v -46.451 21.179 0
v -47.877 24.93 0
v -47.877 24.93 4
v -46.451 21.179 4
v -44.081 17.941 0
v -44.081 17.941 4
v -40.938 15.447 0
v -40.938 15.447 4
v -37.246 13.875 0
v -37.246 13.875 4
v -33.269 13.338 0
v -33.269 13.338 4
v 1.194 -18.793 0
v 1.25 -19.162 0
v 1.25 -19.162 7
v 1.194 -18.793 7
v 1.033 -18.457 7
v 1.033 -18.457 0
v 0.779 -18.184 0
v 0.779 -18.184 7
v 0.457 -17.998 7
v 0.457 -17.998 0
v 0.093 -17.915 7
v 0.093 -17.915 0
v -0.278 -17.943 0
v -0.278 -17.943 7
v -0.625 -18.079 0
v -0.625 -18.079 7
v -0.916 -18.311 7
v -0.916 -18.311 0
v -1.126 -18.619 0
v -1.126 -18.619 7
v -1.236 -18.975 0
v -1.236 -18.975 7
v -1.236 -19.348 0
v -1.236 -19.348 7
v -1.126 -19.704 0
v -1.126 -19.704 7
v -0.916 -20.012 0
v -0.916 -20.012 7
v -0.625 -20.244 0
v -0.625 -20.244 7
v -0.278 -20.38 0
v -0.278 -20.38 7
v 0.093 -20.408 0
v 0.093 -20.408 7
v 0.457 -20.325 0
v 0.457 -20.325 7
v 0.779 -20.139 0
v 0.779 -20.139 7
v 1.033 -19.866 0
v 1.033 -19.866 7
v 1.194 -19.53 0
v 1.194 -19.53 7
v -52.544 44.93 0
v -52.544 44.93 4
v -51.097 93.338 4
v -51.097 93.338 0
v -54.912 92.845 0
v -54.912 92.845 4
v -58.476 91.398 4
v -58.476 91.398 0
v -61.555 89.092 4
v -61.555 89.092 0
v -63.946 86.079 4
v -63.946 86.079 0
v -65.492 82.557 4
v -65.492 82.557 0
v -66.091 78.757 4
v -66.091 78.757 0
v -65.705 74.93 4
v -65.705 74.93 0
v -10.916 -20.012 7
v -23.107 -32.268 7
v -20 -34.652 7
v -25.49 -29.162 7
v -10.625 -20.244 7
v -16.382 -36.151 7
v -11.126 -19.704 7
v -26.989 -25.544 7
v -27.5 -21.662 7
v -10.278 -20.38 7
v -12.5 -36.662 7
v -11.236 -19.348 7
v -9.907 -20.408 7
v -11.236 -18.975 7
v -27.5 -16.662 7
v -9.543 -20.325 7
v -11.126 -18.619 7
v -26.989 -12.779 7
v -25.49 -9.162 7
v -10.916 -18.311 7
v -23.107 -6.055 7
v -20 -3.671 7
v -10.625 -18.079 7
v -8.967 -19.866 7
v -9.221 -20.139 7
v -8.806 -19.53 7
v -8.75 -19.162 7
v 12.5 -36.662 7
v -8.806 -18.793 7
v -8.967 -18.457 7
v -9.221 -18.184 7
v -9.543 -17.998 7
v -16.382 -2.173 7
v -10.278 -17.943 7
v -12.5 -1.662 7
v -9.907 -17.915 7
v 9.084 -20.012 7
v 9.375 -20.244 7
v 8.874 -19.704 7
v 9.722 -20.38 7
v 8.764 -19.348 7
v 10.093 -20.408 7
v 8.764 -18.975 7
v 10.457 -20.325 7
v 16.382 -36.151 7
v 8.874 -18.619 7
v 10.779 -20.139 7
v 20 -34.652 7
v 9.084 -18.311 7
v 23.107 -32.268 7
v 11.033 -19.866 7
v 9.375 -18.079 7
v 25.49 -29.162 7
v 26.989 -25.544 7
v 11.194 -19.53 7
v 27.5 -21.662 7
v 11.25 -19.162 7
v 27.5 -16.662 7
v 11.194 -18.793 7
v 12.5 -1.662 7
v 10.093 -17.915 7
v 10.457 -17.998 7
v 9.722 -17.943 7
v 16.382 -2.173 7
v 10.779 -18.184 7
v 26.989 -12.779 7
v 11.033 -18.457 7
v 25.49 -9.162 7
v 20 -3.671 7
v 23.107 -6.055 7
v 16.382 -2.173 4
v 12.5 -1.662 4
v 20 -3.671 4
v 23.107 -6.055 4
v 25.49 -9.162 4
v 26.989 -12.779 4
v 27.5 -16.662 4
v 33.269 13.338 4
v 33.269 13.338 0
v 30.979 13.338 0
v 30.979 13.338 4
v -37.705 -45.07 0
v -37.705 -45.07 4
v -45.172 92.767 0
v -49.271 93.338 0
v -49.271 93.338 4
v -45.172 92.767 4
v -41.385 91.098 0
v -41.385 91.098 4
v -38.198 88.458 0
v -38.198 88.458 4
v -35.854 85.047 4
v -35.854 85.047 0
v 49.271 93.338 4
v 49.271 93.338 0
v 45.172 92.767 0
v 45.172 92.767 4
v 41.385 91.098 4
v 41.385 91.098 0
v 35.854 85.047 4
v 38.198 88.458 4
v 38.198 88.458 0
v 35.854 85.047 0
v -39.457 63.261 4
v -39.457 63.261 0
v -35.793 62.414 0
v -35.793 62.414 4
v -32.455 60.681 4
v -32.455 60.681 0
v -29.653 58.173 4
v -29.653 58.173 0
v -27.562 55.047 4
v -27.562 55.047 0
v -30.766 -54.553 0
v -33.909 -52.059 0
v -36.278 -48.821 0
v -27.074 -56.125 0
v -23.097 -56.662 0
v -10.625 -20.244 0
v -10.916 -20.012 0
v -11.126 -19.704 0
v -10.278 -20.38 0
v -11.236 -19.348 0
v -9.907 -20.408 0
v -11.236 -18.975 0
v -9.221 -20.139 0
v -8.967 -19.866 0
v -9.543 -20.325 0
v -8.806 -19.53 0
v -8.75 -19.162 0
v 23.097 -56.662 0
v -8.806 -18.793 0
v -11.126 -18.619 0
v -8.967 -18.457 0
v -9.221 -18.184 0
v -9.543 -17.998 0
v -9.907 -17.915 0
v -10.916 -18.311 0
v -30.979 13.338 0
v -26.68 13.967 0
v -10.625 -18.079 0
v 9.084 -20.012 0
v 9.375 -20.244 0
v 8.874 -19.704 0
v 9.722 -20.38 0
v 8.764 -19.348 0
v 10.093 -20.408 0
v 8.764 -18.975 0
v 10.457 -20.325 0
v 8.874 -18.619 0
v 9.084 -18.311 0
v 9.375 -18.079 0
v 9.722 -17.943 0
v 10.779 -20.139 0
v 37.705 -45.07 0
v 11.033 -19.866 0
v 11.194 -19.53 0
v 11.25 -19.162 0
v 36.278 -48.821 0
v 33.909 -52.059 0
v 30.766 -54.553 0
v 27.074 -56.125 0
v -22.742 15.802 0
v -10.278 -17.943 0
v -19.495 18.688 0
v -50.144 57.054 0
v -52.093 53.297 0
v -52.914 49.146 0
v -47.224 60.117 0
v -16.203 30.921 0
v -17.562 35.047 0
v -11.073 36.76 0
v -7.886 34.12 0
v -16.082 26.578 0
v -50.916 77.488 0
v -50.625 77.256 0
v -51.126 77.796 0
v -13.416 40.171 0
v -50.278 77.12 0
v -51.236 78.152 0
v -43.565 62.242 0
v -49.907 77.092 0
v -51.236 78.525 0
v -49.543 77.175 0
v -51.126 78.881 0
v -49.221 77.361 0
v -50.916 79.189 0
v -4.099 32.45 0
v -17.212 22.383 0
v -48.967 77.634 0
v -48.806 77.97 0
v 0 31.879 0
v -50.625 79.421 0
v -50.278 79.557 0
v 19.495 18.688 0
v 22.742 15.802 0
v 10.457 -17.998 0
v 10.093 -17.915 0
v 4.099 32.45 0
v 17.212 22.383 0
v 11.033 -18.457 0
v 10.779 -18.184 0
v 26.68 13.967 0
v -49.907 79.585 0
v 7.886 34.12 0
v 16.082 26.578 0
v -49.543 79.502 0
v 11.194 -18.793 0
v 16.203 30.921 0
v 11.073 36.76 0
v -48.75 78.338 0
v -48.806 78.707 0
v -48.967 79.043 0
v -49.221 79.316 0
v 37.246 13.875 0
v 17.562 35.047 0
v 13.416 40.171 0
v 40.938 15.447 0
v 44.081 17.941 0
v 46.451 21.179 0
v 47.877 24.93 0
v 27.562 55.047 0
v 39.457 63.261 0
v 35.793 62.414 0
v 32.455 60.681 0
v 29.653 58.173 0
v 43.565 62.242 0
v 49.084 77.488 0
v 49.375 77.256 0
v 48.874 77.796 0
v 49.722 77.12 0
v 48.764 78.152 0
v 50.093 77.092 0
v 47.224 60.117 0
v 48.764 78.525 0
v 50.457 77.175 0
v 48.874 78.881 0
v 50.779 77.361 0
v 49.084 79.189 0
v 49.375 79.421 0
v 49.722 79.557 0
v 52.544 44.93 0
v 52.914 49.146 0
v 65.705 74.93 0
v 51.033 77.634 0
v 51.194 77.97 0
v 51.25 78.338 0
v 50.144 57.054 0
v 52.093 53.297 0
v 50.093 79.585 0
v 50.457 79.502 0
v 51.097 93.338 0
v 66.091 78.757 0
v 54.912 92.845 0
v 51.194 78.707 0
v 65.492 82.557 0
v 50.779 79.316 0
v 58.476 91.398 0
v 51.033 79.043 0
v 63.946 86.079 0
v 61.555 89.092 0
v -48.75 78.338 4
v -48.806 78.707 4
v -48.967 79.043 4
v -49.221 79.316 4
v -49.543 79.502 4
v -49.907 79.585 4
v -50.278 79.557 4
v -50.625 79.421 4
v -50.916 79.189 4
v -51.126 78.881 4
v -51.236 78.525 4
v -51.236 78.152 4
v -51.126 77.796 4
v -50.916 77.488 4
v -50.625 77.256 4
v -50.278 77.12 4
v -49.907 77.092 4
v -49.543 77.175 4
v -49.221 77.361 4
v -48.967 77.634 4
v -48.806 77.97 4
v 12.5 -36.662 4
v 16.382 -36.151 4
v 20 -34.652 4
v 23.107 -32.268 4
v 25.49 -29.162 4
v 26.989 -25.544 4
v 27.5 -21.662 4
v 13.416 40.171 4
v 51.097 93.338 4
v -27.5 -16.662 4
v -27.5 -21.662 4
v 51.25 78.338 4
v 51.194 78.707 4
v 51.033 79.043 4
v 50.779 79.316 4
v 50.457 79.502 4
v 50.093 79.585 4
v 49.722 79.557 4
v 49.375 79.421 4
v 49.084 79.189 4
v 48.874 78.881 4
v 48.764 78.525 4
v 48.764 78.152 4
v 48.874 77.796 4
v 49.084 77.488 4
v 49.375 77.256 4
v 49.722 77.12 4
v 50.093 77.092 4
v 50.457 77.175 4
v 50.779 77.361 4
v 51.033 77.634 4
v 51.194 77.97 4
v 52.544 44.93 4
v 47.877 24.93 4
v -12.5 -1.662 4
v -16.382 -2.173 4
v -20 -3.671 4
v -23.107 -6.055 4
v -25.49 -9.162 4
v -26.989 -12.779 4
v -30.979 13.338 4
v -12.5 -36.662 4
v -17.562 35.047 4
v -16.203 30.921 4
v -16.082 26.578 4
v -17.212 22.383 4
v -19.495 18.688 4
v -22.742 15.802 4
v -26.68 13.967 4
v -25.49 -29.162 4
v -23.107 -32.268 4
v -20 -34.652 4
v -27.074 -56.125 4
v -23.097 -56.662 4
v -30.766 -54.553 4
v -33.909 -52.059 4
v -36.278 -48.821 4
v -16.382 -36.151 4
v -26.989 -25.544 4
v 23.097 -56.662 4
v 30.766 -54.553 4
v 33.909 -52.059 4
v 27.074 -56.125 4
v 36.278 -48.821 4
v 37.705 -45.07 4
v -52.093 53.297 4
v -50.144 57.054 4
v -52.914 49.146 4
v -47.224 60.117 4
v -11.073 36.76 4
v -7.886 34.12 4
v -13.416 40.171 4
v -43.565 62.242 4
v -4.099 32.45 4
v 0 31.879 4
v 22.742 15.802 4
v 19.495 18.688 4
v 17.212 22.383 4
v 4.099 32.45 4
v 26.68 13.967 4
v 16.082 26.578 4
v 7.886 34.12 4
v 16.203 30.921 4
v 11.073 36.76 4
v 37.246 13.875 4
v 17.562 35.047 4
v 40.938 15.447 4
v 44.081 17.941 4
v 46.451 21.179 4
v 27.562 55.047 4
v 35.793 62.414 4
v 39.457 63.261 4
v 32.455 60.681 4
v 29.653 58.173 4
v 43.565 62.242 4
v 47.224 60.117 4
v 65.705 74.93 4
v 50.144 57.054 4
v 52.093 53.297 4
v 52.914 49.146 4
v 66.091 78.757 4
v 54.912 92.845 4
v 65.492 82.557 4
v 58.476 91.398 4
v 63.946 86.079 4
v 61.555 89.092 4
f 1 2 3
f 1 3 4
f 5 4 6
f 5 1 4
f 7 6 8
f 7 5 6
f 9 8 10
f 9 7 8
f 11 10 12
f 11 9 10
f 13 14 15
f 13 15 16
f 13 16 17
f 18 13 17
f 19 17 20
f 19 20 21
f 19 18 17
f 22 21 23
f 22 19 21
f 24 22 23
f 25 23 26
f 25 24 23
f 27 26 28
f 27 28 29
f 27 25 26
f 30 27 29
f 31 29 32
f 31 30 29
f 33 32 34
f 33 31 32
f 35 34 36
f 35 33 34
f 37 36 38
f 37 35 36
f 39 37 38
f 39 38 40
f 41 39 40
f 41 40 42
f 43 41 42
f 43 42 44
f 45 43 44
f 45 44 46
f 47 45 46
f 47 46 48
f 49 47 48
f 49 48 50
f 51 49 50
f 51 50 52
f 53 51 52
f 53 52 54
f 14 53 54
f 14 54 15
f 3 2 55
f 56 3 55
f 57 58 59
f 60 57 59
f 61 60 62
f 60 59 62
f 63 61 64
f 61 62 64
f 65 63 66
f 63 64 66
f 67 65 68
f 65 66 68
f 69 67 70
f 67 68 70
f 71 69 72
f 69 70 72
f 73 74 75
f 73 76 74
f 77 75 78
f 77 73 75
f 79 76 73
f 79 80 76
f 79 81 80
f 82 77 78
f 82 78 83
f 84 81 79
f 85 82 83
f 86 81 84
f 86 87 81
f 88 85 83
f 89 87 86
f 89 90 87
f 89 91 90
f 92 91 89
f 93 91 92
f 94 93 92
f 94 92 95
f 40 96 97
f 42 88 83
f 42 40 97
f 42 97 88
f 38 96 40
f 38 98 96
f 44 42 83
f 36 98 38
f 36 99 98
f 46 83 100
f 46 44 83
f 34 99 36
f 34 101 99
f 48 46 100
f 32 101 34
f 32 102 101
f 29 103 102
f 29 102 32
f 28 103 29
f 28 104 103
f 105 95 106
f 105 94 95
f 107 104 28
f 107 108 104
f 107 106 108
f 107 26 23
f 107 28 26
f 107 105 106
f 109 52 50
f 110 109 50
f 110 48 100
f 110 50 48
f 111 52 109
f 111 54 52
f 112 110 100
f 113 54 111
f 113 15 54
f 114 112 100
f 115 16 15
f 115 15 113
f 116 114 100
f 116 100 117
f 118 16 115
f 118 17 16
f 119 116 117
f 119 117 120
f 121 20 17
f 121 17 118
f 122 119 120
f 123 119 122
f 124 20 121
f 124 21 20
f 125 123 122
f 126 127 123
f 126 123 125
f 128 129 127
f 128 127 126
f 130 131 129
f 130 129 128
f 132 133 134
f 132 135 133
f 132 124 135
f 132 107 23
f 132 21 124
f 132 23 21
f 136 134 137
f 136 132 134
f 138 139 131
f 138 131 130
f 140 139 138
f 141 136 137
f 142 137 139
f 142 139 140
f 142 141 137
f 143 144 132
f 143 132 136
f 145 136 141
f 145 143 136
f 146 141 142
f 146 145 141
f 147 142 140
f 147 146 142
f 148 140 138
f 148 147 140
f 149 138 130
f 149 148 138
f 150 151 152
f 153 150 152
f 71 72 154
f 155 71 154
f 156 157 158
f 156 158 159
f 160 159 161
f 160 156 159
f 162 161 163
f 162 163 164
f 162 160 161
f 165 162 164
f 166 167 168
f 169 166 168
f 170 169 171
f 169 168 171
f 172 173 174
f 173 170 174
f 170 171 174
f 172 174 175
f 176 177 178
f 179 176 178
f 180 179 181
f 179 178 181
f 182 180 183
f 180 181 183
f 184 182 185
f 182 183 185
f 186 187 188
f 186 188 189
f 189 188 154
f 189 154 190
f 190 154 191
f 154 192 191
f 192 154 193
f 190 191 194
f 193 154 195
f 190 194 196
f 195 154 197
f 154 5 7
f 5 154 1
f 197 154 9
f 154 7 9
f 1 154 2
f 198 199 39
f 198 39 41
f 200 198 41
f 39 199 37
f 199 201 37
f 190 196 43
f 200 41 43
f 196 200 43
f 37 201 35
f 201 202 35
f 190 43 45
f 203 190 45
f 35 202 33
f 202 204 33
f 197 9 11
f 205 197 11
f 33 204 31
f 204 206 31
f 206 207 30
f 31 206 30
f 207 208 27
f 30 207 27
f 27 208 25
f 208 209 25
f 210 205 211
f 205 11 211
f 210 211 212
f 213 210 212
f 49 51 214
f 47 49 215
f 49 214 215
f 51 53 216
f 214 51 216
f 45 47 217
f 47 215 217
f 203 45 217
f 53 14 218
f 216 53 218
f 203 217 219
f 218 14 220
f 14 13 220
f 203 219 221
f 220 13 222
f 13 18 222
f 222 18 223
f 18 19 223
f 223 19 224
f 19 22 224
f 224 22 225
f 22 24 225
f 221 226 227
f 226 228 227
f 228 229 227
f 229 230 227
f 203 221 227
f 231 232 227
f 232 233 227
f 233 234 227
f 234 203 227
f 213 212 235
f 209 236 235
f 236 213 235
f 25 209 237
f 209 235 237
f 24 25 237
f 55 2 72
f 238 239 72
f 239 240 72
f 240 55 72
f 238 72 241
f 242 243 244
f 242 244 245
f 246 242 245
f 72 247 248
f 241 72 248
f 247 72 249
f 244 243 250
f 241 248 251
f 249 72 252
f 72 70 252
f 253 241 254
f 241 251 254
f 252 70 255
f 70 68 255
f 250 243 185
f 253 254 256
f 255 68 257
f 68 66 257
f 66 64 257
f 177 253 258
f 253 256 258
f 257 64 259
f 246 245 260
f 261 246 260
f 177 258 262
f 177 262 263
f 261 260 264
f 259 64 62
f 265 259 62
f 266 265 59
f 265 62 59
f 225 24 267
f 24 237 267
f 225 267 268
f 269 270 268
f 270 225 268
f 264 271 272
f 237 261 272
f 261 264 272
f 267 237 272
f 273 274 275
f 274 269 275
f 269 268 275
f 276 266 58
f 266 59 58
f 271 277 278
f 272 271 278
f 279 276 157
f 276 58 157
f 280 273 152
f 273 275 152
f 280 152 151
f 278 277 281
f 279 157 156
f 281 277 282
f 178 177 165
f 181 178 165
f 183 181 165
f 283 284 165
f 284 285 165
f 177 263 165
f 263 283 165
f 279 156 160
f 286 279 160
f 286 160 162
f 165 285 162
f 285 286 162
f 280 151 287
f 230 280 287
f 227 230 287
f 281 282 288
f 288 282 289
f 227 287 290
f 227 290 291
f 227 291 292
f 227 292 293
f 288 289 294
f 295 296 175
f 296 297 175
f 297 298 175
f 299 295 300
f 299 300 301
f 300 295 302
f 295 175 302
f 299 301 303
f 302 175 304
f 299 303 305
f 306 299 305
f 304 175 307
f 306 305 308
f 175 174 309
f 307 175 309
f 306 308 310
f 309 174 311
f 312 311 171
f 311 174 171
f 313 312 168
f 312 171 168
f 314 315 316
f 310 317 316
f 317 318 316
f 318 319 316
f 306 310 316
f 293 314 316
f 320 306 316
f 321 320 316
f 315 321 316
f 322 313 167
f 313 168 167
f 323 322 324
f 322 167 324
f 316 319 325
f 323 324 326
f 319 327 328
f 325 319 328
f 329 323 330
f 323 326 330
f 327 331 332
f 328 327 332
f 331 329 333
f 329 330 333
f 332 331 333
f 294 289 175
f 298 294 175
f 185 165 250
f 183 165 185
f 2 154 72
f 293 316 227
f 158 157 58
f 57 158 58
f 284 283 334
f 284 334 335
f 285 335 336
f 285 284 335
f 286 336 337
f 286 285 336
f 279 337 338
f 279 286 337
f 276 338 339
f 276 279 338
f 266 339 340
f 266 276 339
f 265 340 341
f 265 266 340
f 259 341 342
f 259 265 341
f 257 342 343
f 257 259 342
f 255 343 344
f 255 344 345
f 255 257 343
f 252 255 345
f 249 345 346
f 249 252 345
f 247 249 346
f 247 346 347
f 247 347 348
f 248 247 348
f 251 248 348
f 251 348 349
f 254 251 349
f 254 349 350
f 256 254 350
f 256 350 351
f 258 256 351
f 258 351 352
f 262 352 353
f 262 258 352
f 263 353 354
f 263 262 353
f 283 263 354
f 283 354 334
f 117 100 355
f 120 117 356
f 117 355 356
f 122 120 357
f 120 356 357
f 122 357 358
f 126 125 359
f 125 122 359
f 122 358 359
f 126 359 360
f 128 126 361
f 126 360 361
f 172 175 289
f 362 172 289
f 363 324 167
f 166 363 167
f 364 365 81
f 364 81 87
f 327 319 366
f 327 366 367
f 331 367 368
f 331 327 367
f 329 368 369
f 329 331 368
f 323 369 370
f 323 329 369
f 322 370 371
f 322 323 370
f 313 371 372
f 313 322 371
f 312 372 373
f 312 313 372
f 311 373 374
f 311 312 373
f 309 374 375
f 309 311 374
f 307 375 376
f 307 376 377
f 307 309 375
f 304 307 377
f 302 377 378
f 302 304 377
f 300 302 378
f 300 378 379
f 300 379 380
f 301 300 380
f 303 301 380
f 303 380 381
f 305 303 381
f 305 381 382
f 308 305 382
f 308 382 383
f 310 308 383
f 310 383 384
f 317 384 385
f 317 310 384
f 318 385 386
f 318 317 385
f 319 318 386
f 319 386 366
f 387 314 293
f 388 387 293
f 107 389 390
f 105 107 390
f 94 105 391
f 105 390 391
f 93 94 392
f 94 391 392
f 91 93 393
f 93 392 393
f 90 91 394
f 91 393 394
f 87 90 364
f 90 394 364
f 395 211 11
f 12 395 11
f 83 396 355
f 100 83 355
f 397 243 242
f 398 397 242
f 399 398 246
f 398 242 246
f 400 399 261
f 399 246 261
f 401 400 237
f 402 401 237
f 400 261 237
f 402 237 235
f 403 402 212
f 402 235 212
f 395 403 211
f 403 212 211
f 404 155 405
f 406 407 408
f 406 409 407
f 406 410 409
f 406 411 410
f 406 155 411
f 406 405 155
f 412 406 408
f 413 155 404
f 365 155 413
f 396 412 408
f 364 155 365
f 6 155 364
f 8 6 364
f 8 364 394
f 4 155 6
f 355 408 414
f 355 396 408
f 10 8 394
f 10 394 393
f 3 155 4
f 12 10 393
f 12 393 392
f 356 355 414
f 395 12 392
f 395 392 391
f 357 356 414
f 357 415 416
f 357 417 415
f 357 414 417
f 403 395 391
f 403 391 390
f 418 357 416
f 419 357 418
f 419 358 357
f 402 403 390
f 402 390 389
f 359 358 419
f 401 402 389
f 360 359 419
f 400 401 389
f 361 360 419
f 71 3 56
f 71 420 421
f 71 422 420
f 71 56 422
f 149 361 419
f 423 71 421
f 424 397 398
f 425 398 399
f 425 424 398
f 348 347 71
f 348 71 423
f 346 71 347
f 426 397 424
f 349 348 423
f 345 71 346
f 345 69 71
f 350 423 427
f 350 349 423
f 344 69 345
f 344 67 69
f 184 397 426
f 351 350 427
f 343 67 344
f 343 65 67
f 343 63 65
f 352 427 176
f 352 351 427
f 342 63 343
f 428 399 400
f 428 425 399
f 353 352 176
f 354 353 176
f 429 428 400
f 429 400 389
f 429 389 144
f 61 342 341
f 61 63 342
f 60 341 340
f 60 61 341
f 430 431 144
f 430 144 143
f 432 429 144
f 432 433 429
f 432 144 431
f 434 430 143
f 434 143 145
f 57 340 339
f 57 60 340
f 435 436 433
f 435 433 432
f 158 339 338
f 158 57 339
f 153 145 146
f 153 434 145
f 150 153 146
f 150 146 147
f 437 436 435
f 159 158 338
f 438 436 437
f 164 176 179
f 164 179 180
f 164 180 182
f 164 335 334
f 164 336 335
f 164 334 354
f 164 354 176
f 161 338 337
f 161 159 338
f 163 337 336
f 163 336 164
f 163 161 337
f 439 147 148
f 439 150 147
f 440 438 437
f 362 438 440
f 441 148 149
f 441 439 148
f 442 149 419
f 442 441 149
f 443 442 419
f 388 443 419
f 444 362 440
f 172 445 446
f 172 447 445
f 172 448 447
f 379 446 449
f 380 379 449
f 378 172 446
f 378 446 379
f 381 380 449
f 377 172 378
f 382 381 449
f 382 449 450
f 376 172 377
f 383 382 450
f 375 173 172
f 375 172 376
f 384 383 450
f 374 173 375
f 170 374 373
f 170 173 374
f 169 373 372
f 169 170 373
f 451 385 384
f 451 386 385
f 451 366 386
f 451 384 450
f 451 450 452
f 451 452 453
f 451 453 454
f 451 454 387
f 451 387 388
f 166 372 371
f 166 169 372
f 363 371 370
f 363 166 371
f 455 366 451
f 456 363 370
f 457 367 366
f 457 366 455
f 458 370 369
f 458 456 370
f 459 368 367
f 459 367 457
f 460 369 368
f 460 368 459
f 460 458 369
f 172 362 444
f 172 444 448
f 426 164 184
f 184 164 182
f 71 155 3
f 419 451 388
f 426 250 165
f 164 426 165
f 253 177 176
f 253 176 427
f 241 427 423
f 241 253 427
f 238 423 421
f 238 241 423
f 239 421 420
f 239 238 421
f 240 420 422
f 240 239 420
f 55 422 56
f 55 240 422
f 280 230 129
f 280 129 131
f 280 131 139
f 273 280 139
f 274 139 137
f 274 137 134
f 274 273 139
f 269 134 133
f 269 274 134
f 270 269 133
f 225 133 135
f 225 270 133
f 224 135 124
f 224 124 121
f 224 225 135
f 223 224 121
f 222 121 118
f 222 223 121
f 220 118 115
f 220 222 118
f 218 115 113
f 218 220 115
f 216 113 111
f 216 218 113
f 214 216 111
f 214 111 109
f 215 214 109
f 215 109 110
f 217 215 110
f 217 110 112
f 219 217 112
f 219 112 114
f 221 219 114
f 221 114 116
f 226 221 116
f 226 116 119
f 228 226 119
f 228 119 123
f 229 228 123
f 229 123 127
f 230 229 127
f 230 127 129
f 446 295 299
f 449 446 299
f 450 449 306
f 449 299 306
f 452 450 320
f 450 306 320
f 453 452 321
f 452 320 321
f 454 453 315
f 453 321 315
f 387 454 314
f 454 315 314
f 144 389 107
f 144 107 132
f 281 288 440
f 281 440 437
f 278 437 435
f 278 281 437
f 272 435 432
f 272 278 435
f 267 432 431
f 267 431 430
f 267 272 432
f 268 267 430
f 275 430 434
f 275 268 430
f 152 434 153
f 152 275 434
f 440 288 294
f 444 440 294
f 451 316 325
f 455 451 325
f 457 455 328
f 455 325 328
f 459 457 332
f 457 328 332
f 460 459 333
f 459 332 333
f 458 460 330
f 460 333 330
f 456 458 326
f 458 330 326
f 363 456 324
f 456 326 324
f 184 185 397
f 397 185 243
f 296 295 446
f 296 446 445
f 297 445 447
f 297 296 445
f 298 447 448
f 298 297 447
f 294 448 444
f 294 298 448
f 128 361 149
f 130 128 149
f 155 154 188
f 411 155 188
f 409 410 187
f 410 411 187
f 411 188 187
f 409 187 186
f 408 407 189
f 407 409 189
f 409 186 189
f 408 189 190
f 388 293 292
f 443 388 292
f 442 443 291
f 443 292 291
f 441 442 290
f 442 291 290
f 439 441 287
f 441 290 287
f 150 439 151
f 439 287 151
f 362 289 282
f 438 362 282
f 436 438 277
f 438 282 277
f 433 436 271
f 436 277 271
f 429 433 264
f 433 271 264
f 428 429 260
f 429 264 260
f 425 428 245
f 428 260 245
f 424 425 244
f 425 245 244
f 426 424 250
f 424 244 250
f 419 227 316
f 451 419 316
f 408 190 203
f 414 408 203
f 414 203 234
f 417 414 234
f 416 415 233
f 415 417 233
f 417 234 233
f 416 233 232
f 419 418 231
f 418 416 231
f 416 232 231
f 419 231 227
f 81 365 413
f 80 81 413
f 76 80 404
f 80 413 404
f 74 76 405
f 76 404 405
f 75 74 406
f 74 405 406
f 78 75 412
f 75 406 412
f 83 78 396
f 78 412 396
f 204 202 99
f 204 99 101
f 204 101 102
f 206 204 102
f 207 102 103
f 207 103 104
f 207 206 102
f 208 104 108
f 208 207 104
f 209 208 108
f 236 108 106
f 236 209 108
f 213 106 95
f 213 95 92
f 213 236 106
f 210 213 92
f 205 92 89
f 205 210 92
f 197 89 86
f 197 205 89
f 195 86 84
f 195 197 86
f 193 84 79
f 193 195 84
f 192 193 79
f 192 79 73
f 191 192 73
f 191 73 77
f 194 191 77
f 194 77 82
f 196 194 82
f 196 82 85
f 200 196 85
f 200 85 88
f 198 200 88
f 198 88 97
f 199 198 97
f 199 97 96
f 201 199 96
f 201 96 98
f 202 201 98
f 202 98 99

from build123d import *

# Parameters (mm, degrees)
F0_R        = 1.25
F0_W        = 70
F0_H        = 60
F0_W_2      = 55
F0_H_2      = 35
F1_DEPTH    = 4
F2_DEPTH    = 7
F3_T1_DEPTH = 4
F3_T3_DEPTH = 50.3525491562
F3_T5_DEPTH = 98.5146090037
F3_T7_DEPTH = 40.5
F3_T9_DEPTH = 63.5146090037


# Not quite as in the source:
# - a fillet or chamfer that OpenCascade refuses, or shapes differently, is made with other operations: its cross-section is extruded or revolved along the edge and cut away or added


with BuildPart() as f1:
    # F0 (on Top) → F1 (new body)
    with BuildSketch(Plane.XY):
        Polygon((-40, 93.3383707737), (-70, 93.3383707737), (-35, -56.6616292263), (-35, 3.3383707737), (35, 3.3383707737), (35, -56.6616292263), (70, 93.3383707737), (40, 93.3383707737), (0, 13.3383707737), align=None)
        Polygon((-45.172164613, 13.3383707737), (-56.8388312797, 63.3383707737), (-31.7082039325, 63.3383707737), (-6.7082039325, 13.3383707737), align=None, mode=Mode.SUBTRACT)
        with Locations((-50, 78.3383707737)):
            Circle(F0_R, mode=Mode.SUBTRACT)
        Polygon((6.7082039325, 13.3383707737), (31.7082039325, 63.3383707737), (56.8388312797, 63.3383707737), (45.172164613, 13.3383707737), align=None, mode=Mode.SUBTRACT)
        with Locations((50, 78.3383707737)):
            Circle(F0_R, mode=Mode.SUBTRACT)
        with Locations((0, -26.6616292263)):
            Rectangle(F0_W, F0_H)
        with Locations((0, -19.1616292263)):
            Rectangle(F0_W_2, F0_H_2, mode=Mode.SUBTRACT)
        with Locations((0, -19.1616292263)):
            Rectangle(F0_W_2, F0_H_2)
        with Locations((-10, -19.1616292263)):
            Circle(F0_R, mode=Mode.SUBTRACT)
        with Locations((0, -19.1616292263)):
            Circle(F0_R, mode=Mode.SUBTRACT)
        with Locations((10, -19.1616292263)):
            Circle(F0_R, mode=Mode.SUBTRACT)
    extrude(amount=F1_DEPTH)

    # F0 (on Top) → F2 (join)
    with BuildSketch(Plane.XY):
        with Locations((0, -19.1616292263)):
            Rectangle(F0_W_2, F0_H_2)
        with Locations((-10, -19.1616292263)):
            Circle(F0_R, mode=Mode.SUBTRACT)
        with Locations((0, -19.1616292263)):
            Circle(F0_R, mode=Mode.SUBTRACT)
        with Locations((10, -19.1616292263)):
            Circle(F0_R, mode=Mode.SUBTRACT)
    extrude(amount=F2_DEPTH)

    # F3: fillet of radius 15 on 19 edges, made by hand

    # F3_s2 → F3_t1 (join)
    with BuildSketch(Plane.XY):
        with BuildLine():
            ThreePointArc((13.416407865, 40.1711865037), (0, 31.8793904362), (-13.416407865, 40.1711865037))
            Line((-13.416407865, 40.1711865037), (0, 13.3383707737))
            Line((0, 13.3383707737), (13.416407865, 40.1711865037))
        make_face()
        with BuildLine():
            ThreePointArc((17.5623058987, 35.0465747062), (18.2189516385, 20.452404092), (30.9787137637, 13.3383707737))
            Line((30.9787137637, 13.3383707737), (6.7082039325, 13.3383707737))
            Line((6.7082039325, 13.3383707737), (17.5623058987, 35.0465747062))
        make_face()
        with BuildLine():
            ThreePointArc((47.8768609584, 24.9299265396), (42.5932263089, 16.5883353799), (33.2692428123, 13.3383707737))
            Line((33.2692428123, 13.3383707737), (45.172164613, 13.3383707737))
            Line((45.172164613, 13.3383707737), (47.8768609584, 24.9299265396))
        make_face()
        with BuildLine():
            ThreePointArc((-17.5623058987, 35.0465747062), (-18.2189516385, 20.452404092), (-30.9787137637, 13.3383707737))
            Line((-30.9787137637, 13.3383707737), (-6.7082039325, 13.3383707737))
            Line((-6.7082039325, 13.3383707737), (-17.5623058987, 35.0465747062))
        make_face()
        with BuildLine():
            ThreePointArc((-47.8768609584, 24.9299265396), (-42.5932263089, 16.5883353799), (-33.2692428123, 13.3383707737))
            Line((-33.2692428123, 13.3383707737), (-45.172164613, 13.3383707737))
            Line((-45.172164613, 13.3383707737), (-47.8768609584, 24.9299265396))
        make_face()
        with BuildLine():
            ThreePointArc((-37.935909479, 63.3383707737), (-49.6859448728, 57.6623542703), (-52.5435276251, 44.9299265396))
            Line((-52.5435276251, 44.9299265396), (-56.8388312797, 63.3383707737))
            Line((-56.8388312797, 63.3383707737), (-37.935909479, 63.3383707737))
        make_face()
        with BuildLine():
            ThreePointArc((-40.9787137637, 63.3383707737), (-33.092747082, 61.098132899), (-27.5623058987, 55.0465747062))
            Line((-27.5623058987, 55.0465747062), (-31.7082039325, 63.3383707737))
            Line((-31.7082039325, 63.3383707737), (-40.9787137637, 63.3383707737))
        make_face()
        with BuildLine():
            ThreePointArc((40.9787137637, 63.3383707737), (33.092747082, 61.098132899), (27.5623058987, 55.0465747062))
            Line((27.5623058987, 55.0465747062), (31.7082039325, 63.3383707737))
            Line((31.7082039325, 63.3383707737), (40.9787137637, 63.3383707737))
        make_face()
        with BuildLine():
            ThreePointArc((37.935909479, 63.3383707737), (49.6859448728, 57.6623542703), (52.5435276251, 44.9299265396))
            Line((52.5435276251, 44.9299265396), (56.8388312797, 63.3383707737))
            Line((56.8388312797, 63.3383707737), (37.935909479, 63.3383707737))
        make_face()
    extrude(amount=F3_T1_DEPTH)

    # F3_s4 → F3_t3 (cut)
    with BuildSketch(Plane.XY.offset(-23.1762745781)):
        with BuildLine():
            ThreePointArc((49.2705098312, 93.3383707737), (41.3845431495, 91.098132899), (35.8541019662, 85.0465747062))
            Line((35.8541019662, 85.0465747062), (40, 93.3383707737))
            Line((40, 93.3383707737), (49.2705098312, 93.3383707737))
        make_face()
        with BuildLine():
            ThreePointArc((-49.2705098312, 93.3383707737), (-41.3845431495, 91.098132899), (-35.8541019662, 85.0465747062))
            Line((-35.8541019662, 85.0465747062), (-40, 93.3383707737))
            Line((-40, 93.3383707737), (-49.2705098312, 93.3383707737))
        make_face()
    extrude(amount=F3_T3_DEPTH, mode=Mode.SUBTRACT)

    # F3_s6 → F3_t5 (cut)
    with BuildSketch(Plane.XY.offset(-47.2573045019)):
        with BuildLine():
            ThreePointArc((65.7046963454, 74.9299265396), (62.8471135931, 87.6623542703), (51.0970781993, 93.3383707737))
            Line((51.0970781993, 93.3383707737), (70, 93.3383707737))
            Line((70, 93.3383707737), (65.7046963454, 74.9299265396))
        make_face()
        with BuildLine():
            ThreePointArc((-51.0970781993, 93.3383707737), (-62.8471135931, 87.6623542703), (-65.7046963454, 74.9299265396))
            Line((-65.7046963454, 74.9299265396), (-70, 93.3383707737))
            Line((-70, 93.3383707737), (-51.0970781993, 93.3383707737))
        make_face()
    extrude(amount=F3_T5_DEPTH, mode=Mode.SUBTRACT)

    # F3_s8 → F3_t7 (cut)
    with BuildSketch(Plane.XY.offset(4)):
        with BuildLine():
            ThreePointArc((12.5, -1.6616292263), (23.1066017178, -6.0550275085), (27.5, -16.6616292263))
            Line((27.5, -16.6616292263), (27.5, -1.6616292263))
            Line((27.5, -1.6616292263), (12.5, -1.6616292263))
        make_face()
        with BuildLine():
            ThreePointArc((-12.5, -1.6616292263), (-23.1066017178, -6.0550275085), (-27.5, -16.6616292263))
            Line((-27.5, -16.6616292263), (-27.5, -1.6616292263))
            Line((-27.5, -1.6616292263), (-12.5, -1.6616292263))
        make_face()
        with BuildLine():
            ThreePointArc((12.5, -36.6616292263), (23.1066017178, -32.2682309441), (27.5, -21.6616292263))
            Line((27.5, -21.6616292263), (27.5, -36.6616292263))
            Line((27.5, -36.6616292263), (12.5, -36.6616292263))
        make_face()
        with BuildLine():
            ThreePointArc((-27.5, -21.6616292263), (-23.1066017178, -32.2682309441), (-12.5, -36.6616292263))
            Line((-12.5, -36.6616292263), (-27.5, -36.6616292263))
            Line((-27.5, -36.6616292263), (-27.5, -21.6616292263))
        make_face()
    extrude(amount=F3_T7_DEPTH, mode=Mode.SUBTRACT)

    # F3_s10 → F3_t9 (cut)
    with BuildSketch(Plane.XY.offset(-29.7573045019)):
        with BuildLine():
            ThreePointArc((-37.7046963454, -45.0700734604), (-32.4210616958, -53.4116646201), (-23.0970781993, -56.6616292263))
            Line((-23.0970781993, -56.6616292263), (-35, -56.6616292263))
            Line((-35, -56.6616292263), (-37.7046963454, -45.0700734604))
        make_face()
        with BuildLine():
            ThreePointArc((23.0970781993, -56.6616292263), (32.4210616958, -53.4116646201), (37.7046963454, -45.0700734604))
            Line((37.7046963454, -45.0700734604), (35, -56.6616292263))
            Line((35, -56.6616292263), (23.0970781993, -56.6616292263))
        make_face()
    extrude(amount=F3_T9_DEPTH, mode=Mode.SUBTRACT)


solid = f1.part
